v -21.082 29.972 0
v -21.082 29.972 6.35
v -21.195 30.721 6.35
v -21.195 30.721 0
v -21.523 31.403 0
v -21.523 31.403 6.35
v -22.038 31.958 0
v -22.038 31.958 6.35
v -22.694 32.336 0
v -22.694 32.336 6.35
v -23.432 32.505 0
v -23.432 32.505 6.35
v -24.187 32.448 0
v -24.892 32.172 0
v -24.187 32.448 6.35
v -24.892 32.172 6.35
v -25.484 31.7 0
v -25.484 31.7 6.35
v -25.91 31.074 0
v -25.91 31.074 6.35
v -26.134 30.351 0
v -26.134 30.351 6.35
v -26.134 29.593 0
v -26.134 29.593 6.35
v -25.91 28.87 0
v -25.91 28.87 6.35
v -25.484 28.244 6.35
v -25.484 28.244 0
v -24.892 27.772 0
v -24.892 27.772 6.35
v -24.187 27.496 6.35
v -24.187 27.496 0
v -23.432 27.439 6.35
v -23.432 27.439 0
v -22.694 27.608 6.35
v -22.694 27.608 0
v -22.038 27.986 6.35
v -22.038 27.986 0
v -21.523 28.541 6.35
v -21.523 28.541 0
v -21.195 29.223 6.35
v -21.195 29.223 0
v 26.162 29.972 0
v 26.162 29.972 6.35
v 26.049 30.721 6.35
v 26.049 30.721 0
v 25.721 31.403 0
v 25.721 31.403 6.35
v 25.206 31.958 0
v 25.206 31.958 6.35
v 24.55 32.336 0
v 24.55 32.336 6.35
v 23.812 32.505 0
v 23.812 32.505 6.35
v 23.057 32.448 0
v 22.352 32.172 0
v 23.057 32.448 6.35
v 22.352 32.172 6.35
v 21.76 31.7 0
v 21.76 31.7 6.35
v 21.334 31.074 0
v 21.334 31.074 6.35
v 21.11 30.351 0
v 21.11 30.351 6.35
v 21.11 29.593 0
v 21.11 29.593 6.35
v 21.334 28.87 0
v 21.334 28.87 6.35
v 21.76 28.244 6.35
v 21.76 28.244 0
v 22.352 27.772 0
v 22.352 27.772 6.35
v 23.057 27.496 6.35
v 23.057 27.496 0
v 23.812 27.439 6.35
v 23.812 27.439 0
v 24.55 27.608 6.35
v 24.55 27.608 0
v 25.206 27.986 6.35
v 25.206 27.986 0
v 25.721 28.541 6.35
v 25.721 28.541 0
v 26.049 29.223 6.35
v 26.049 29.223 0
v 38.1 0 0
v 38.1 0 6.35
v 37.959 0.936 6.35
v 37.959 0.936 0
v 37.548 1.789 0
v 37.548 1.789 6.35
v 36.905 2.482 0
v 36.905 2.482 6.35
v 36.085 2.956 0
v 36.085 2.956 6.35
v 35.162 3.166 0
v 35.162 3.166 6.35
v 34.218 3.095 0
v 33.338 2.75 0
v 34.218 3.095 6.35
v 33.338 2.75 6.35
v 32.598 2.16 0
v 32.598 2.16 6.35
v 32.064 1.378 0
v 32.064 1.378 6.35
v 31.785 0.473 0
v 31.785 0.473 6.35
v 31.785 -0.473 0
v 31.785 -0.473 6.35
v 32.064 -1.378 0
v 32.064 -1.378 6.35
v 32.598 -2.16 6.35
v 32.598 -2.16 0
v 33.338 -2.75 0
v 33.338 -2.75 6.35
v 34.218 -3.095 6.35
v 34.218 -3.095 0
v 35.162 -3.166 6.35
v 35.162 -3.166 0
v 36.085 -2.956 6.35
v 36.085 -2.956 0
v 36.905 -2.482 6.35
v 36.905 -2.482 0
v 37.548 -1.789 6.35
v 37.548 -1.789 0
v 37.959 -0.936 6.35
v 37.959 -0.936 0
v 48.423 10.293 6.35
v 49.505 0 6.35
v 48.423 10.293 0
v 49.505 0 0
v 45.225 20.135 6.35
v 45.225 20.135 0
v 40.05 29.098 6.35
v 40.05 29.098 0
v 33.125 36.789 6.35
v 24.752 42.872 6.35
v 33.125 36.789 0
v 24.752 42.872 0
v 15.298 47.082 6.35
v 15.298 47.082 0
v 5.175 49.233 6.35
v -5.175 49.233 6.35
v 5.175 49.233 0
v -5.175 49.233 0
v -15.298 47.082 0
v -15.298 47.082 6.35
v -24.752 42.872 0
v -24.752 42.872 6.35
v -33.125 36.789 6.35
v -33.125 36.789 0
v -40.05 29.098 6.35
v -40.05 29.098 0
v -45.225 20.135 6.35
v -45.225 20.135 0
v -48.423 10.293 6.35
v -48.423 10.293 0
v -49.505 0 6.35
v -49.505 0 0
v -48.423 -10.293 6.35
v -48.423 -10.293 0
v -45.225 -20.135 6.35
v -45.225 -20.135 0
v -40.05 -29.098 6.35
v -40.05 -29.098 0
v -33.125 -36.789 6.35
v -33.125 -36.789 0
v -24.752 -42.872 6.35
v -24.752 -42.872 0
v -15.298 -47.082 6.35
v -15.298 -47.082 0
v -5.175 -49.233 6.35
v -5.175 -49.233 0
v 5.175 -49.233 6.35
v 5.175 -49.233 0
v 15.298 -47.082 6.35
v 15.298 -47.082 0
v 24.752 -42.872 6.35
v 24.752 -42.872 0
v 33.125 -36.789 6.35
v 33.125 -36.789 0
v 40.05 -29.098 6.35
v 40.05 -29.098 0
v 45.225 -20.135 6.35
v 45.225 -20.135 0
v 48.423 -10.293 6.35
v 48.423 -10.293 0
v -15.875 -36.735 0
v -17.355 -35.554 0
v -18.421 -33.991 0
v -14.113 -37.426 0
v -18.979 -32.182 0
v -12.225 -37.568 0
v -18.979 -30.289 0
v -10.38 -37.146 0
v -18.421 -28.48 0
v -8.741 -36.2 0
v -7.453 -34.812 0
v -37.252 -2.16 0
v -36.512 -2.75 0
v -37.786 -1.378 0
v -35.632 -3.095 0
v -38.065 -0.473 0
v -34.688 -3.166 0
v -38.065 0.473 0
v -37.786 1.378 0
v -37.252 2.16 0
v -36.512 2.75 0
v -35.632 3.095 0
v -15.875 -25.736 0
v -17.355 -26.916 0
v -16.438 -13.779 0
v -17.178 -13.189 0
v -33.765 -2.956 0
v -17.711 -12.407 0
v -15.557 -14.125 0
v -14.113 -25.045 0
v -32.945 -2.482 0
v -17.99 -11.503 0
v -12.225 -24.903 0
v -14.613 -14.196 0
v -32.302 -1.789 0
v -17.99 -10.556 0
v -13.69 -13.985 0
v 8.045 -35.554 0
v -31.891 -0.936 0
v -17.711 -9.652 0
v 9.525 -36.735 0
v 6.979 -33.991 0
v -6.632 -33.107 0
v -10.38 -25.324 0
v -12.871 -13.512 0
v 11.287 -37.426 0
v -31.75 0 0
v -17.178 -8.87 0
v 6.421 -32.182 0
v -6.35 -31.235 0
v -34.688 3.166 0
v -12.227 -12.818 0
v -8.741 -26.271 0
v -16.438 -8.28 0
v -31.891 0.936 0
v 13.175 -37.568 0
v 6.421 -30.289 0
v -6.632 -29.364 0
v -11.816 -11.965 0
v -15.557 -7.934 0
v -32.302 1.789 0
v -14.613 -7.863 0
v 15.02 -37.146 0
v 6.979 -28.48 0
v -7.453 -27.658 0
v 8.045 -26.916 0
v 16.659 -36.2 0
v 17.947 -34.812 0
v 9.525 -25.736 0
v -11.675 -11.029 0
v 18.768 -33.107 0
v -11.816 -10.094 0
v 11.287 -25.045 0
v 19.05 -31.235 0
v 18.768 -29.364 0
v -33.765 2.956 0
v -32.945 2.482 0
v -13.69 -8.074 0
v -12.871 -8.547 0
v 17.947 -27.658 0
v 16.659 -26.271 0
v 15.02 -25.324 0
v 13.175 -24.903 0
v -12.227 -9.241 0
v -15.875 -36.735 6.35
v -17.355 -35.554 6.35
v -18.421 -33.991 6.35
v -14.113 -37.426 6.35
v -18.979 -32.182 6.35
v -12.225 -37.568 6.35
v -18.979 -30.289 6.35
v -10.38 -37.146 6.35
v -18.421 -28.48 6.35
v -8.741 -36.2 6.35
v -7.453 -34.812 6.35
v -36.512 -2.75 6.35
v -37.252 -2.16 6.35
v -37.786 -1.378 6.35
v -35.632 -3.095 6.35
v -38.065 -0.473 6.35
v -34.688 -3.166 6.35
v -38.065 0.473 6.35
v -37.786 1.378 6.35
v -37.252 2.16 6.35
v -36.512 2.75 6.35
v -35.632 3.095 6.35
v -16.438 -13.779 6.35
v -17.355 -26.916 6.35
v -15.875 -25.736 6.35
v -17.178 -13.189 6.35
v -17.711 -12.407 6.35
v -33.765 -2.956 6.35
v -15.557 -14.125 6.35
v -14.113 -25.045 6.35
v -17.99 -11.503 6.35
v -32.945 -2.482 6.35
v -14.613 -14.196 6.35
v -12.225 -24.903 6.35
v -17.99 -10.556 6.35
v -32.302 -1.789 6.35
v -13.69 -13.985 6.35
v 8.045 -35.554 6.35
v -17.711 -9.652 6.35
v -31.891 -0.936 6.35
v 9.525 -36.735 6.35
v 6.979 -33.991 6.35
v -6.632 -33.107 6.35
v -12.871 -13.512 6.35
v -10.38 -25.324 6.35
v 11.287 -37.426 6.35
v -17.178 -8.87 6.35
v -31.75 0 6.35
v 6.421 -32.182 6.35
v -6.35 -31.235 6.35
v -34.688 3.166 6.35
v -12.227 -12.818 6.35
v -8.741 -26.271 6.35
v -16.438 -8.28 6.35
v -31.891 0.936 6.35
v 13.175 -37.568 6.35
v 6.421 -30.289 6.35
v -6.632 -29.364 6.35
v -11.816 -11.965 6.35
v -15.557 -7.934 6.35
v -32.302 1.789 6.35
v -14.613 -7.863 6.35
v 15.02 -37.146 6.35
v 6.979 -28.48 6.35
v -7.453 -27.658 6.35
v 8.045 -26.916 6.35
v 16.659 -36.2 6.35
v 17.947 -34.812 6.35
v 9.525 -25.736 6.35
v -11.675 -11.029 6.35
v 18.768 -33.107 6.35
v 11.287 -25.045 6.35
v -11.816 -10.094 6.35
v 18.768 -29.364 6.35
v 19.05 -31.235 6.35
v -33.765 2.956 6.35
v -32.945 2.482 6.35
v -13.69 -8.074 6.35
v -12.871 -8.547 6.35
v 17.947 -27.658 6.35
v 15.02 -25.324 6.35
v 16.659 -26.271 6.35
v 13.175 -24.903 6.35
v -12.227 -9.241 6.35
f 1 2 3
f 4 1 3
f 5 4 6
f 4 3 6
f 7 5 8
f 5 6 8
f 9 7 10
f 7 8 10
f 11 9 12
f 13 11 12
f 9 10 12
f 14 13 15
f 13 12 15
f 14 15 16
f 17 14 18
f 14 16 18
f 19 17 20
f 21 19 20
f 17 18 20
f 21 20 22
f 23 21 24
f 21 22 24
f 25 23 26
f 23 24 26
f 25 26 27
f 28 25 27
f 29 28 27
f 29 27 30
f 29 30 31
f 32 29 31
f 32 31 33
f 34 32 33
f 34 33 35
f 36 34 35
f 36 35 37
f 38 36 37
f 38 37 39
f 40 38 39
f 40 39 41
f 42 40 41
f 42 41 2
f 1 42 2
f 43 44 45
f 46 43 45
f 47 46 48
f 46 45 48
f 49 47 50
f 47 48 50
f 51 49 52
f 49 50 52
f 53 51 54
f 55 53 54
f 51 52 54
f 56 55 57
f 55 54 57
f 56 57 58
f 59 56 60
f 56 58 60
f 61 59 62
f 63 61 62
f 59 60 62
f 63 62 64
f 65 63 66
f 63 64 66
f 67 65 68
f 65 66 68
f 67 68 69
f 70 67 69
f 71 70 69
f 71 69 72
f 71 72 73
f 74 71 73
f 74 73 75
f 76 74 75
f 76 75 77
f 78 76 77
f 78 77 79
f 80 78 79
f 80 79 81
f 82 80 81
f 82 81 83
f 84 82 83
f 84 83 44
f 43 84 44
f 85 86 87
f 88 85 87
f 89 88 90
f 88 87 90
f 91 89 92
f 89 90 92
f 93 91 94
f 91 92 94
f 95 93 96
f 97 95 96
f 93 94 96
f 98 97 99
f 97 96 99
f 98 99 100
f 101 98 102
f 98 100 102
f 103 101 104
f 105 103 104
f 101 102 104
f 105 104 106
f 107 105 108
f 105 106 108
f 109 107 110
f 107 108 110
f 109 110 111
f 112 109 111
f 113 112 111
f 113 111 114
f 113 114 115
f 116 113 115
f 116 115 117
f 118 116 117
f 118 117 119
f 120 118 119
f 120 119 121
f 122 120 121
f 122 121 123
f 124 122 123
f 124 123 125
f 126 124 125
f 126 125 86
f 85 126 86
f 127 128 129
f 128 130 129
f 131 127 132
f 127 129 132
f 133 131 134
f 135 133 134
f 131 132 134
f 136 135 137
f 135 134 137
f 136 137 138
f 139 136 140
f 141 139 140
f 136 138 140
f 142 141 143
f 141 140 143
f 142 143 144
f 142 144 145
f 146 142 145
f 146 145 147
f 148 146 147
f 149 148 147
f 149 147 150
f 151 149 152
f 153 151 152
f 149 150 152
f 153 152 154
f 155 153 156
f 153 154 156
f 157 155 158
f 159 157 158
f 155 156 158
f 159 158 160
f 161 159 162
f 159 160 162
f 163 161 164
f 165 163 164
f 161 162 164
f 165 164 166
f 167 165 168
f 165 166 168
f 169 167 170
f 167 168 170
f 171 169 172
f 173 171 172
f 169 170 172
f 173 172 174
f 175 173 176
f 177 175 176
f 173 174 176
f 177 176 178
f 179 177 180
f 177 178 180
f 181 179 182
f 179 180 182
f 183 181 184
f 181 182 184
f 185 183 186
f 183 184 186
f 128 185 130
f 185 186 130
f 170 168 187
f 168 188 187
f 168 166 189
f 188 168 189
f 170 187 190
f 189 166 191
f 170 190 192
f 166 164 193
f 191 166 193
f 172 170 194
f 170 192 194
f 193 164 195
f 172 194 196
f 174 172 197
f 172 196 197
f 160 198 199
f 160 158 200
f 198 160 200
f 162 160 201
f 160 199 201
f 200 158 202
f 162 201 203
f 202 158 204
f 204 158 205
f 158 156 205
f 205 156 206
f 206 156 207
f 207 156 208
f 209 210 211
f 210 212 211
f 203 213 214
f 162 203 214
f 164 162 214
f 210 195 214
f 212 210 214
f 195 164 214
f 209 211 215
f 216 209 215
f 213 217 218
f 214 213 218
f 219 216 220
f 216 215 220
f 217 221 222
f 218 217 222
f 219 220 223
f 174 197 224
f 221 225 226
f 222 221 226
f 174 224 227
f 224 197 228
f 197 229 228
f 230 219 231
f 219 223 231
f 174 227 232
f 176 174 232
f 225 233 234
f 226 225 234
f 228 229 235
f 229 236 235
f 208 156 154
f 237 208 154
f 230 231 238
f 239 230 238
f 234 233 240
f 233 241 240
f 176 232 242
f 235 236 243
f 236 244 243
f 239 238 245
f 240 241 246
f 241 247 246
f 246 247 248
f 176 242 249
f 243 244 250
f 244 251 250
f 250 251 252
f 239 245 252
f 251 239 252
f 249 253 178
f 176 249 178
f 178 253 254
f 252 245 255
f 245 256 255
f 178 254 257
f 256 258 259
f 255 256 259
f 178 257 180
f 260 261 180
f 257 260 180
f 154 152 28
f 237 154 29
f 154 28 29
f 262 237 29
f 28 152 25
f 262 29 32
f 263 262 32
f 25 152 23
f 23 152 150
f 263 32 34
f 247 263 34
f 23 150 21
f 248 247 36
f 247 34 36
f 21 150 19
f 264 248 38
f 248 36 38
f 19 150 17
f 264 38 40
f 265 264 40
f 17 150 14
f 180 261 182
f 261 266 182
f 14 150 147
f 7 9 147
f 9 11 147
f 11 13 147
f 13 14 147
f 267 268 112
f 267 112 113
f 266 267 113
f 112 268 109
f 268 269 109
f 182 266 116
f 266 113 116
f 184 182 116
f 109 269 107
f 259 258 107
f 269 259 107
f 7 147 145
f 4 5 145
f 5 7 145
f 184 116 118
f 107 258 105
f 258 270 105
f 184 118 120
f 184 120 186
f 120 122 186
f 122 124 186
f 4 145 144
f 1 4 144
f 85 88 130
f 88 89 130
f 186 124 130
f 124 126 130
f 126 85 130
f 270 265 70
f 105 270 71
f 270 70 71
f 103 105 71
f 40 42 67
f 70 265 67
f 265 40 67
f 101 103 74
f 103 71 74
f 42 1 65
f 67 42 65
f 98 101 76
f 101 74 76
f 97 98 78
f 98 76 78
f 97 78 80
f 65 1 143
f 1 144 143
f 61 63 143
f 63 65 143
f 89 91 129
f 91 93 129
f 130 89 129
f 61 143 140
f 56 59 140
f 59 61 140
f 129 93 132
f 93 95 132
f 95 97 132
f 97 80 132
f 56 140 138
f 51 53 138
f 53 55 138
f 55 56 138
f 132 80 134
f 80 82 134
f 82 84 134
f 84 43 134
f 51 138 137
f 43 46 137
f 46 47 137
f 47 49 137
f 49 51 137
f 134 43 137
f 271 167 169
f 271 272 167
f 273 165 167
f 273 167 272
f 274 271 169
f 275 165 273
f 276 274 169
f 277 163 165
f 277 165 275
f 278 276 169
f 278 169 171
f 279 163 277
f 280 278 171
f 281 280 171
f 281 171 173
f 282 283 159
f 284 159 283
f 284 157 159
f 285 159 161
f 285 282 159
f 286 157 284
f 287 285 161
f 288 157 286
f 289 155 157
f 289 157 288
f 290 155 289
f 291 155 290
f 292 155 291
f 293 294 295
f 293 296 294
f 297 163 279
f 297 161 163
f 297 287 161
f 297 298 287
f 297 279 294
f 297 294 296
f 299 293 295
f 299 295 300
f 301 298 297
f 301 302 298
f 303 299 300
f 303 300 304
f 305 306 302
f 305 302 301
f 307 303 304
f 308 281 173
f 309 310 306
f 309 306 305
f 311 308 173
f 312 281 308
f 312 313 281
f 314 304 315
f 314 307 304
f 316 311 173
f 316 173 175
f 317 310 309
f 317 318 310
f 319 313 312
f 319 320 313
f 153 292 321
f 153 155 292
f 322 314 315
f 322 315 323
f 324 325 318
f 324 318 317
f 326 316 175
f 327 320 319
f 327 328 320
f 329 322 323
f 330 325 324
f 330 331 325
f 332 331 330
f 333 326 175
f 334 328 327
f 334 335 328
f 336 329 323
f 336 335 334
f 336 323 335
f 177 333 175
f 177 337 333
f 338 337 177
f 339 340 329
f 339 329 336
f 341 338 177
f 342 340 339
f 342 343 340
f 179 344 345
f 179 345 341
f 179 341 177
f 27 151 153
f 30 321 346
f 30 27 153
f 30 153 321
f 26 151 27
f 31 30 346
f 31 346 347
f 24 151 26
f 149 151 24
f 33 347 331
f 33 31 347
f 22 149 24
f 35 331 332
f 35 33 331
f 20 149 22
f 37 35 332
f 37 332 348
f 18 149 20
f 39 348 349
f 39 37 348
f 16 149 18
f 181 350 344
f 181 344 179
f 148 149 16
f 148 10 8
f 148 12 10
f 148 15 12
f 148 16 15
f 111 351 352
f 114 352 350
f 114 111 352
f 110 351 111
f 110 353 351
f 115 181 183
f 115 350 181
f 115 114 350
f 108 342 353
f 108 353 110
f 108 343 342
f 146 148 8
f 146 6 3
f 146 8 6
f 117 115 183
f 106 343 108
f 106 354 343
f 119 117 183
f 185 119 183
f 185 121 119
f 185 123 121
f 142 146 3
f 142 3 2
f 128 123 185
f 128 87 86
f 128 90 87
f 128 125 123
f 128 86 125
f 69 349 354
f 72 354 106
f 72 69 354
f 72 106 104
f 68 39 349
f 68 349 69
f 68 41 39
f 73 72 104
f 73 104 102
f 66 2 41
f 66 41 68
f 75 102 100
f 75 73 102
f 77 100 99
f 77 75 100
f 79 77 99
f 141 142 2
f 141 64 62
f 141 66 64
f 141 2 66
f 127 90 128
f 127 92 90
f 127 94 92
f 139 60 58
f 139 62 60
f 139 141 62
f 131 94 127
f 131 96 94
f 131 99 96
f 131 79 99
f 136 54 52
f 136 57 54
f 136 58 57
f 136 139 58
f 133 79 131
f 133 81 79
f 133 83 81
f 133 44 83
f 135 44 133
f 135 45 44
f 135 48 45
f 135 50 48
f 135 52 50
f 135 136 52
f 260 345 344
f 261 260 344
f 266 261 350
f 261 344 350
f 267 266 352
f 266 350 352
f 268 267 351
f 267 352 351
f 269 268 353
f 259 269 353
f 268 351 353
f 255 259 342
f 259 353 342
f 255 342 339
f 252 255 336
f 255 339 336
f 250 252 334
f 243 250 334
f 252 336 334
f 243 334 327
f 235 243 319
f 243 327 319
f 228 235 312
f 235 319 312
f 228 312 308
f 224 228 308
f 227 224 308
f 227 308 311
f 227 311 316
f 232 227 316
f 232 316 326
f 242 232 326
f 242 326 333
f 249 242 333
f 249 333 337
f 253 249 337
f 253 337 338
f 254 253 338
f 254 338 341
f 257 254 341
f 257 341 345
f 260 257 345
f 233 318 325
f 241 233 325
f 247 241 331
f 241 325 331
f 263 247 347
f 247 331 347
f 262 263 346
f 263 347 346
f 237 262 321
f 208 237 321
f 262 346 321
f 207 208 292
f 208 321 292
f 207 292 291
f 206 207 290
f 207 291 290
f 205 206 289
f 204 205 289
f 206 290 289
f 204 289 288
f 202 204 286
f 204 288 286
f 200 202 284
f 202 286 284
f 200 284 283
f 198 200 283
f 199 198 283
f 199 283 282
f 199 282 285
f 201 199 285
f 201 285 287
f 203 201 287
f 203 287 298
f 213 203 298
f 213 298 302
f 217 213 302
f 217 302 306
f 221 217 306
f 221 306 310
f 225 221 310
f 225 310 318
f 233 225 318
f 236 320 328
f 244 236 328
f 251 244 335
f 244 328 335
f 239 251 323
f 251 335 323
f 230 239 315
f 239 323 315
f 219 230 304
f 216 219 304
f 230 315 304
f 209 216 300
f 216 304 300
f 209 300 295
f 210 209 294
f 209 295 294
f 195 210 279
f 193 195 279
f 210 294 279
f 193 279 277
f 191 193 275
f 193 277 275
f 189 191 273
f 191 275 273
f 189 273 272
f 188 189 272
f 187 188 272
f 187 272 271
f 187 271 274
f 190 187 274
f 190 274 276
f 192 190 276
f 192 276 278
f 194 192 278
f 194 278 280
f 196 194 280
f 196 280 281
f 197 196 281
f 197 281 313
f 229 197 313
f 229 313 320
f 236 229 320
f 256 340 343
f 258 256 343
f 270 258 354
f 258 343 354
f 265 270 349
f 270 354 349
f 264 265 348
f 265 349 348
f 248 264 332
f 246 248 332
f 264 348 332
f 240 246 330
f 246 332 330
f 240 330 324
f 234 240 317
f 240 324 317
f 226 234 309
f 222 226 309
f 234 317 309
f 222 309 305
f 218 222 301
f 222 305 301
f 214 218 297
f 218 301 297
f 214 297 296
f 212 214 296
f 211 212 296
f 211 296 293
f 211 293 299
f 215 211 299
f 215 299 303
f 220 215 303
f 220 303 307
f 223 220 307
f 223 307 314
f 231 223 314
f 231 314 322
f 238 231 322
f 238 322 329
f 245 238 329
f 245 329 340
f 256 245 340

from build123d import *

# Parameters (mm, degrees)
SKETCH1_R           = 49.5046
BOSS_EXTRUDE1_DEPTH = 3.175
SKETCH2_R           = 47.6885
BOSS_EXTRUDE2_DEPTH = 3.175
SKETCH3_R           = 6.35
SKETCH3_R_2         = 3.175
SKETCH3_R_3         = 11.1125
SKETCH3_R_4         = 2.54
CUT_EXTRUDE1_DEPTH  = 71.297463271
BOSS_EXTRUDE3_START = -3.175
SKETCH4_R           = 49.5046
SKETCH4_R_2         = 47.6885
BOSS_EXTRUDE3_DEPTH = 3.175
SKETCH5_R           = 11.1125
BOSS_EXTRUDE4_DEPTH = 6.35
SKETCH6_R           = 2.54
BOSS_EXTRUDE5_DEPTH = 6.35


with BuildPart() as part:
    # Sketch1 → Boss-Extrude1 (new body)
    with BuildSketch(Plane.XY):
        Circle(SKETCH1_R)
    extrude(amount=BOSS_EXTRUDE1_DEPTH)

    # Sketch2 → Boss-Extrude2 (add)
    with BuildSketch(Plane.XY.offset(3.175)):
        Circle(SKETCH2_R)
    extrude(amount=BOSS_EXTRUDE2_DEPTH)

    # Sketch3 → Cut-Extrude1 (cut, through all)
    with BuildSketch(Plane.XY.offset(6.35)):
        with Locations((-12.7, -31.235352443)):
            Circle(SKETCH3_R)
        with Locations((12.7, -31.235352443)):
            Circle(SKETCH3_R)
        with Locations((-34.925, 0)):
            Circle(SKETCH3_R_2)
        with Locations((34.925, 0)):
            Circle(SKETCH3_R_2)
        with Locations((0, 6.35)):
            Circle(SKETCH3_R_3)
        with Locations((-14.850390051, -11.029456704)):
            Circle(SKETCH3_R_2)
        with Locations((-23.622, 29.972)):
            Circle(SKETCH3_R_4)
        with Locations((23.622, 29.972)):
            Circle(SKETCH3_R_4)
        with Locations((23.622, -17.272)):
            Circle(SKETCH3_R_4)
        with Locations((-23.622, -17.272)):
            Circle(SKETCH3_R_4)
    extrude(amount=-CUT_EXTRUDE1_DEPTH, mode=Mode.SUBTRACT)

    # Sketch4 → Boss-Extrude3 (add)
    with BuildSketch(Plane.XY.offset(6.35).offset(BOSS_EXTRUDE3_START)):
        Circle(SKETCH4_R)
        Circle(SKETCH4_R_2, mode=Mode.SUBTRACT)
    extrude(amount=BOSS_EXTRUDE3_DEPTH)

    # Sketch5 → Boss-Extrude4 (add)
    with BuildSketch(Plane.XY.offset(6.35)):
        with Locations((0, 6.35)):
            Circle(SKETCH5_R)
    extrude(amount=-BOSS_EXTRUDE4_DEPTH)

    # Sketch6 → Boss-Extrude5 (add)
    with BuildSketch(Plane.XY.offset(6.35)):
        with Locations((-23.622, -17.272)):
            Circle(SKETCH6_R)
        with Locations((23.622, -17.272)):
            Circle(SKETCH6_R)
    extrude(amount=-BOSS_EXTRUDE5_DEPTH)


solid = part.part
